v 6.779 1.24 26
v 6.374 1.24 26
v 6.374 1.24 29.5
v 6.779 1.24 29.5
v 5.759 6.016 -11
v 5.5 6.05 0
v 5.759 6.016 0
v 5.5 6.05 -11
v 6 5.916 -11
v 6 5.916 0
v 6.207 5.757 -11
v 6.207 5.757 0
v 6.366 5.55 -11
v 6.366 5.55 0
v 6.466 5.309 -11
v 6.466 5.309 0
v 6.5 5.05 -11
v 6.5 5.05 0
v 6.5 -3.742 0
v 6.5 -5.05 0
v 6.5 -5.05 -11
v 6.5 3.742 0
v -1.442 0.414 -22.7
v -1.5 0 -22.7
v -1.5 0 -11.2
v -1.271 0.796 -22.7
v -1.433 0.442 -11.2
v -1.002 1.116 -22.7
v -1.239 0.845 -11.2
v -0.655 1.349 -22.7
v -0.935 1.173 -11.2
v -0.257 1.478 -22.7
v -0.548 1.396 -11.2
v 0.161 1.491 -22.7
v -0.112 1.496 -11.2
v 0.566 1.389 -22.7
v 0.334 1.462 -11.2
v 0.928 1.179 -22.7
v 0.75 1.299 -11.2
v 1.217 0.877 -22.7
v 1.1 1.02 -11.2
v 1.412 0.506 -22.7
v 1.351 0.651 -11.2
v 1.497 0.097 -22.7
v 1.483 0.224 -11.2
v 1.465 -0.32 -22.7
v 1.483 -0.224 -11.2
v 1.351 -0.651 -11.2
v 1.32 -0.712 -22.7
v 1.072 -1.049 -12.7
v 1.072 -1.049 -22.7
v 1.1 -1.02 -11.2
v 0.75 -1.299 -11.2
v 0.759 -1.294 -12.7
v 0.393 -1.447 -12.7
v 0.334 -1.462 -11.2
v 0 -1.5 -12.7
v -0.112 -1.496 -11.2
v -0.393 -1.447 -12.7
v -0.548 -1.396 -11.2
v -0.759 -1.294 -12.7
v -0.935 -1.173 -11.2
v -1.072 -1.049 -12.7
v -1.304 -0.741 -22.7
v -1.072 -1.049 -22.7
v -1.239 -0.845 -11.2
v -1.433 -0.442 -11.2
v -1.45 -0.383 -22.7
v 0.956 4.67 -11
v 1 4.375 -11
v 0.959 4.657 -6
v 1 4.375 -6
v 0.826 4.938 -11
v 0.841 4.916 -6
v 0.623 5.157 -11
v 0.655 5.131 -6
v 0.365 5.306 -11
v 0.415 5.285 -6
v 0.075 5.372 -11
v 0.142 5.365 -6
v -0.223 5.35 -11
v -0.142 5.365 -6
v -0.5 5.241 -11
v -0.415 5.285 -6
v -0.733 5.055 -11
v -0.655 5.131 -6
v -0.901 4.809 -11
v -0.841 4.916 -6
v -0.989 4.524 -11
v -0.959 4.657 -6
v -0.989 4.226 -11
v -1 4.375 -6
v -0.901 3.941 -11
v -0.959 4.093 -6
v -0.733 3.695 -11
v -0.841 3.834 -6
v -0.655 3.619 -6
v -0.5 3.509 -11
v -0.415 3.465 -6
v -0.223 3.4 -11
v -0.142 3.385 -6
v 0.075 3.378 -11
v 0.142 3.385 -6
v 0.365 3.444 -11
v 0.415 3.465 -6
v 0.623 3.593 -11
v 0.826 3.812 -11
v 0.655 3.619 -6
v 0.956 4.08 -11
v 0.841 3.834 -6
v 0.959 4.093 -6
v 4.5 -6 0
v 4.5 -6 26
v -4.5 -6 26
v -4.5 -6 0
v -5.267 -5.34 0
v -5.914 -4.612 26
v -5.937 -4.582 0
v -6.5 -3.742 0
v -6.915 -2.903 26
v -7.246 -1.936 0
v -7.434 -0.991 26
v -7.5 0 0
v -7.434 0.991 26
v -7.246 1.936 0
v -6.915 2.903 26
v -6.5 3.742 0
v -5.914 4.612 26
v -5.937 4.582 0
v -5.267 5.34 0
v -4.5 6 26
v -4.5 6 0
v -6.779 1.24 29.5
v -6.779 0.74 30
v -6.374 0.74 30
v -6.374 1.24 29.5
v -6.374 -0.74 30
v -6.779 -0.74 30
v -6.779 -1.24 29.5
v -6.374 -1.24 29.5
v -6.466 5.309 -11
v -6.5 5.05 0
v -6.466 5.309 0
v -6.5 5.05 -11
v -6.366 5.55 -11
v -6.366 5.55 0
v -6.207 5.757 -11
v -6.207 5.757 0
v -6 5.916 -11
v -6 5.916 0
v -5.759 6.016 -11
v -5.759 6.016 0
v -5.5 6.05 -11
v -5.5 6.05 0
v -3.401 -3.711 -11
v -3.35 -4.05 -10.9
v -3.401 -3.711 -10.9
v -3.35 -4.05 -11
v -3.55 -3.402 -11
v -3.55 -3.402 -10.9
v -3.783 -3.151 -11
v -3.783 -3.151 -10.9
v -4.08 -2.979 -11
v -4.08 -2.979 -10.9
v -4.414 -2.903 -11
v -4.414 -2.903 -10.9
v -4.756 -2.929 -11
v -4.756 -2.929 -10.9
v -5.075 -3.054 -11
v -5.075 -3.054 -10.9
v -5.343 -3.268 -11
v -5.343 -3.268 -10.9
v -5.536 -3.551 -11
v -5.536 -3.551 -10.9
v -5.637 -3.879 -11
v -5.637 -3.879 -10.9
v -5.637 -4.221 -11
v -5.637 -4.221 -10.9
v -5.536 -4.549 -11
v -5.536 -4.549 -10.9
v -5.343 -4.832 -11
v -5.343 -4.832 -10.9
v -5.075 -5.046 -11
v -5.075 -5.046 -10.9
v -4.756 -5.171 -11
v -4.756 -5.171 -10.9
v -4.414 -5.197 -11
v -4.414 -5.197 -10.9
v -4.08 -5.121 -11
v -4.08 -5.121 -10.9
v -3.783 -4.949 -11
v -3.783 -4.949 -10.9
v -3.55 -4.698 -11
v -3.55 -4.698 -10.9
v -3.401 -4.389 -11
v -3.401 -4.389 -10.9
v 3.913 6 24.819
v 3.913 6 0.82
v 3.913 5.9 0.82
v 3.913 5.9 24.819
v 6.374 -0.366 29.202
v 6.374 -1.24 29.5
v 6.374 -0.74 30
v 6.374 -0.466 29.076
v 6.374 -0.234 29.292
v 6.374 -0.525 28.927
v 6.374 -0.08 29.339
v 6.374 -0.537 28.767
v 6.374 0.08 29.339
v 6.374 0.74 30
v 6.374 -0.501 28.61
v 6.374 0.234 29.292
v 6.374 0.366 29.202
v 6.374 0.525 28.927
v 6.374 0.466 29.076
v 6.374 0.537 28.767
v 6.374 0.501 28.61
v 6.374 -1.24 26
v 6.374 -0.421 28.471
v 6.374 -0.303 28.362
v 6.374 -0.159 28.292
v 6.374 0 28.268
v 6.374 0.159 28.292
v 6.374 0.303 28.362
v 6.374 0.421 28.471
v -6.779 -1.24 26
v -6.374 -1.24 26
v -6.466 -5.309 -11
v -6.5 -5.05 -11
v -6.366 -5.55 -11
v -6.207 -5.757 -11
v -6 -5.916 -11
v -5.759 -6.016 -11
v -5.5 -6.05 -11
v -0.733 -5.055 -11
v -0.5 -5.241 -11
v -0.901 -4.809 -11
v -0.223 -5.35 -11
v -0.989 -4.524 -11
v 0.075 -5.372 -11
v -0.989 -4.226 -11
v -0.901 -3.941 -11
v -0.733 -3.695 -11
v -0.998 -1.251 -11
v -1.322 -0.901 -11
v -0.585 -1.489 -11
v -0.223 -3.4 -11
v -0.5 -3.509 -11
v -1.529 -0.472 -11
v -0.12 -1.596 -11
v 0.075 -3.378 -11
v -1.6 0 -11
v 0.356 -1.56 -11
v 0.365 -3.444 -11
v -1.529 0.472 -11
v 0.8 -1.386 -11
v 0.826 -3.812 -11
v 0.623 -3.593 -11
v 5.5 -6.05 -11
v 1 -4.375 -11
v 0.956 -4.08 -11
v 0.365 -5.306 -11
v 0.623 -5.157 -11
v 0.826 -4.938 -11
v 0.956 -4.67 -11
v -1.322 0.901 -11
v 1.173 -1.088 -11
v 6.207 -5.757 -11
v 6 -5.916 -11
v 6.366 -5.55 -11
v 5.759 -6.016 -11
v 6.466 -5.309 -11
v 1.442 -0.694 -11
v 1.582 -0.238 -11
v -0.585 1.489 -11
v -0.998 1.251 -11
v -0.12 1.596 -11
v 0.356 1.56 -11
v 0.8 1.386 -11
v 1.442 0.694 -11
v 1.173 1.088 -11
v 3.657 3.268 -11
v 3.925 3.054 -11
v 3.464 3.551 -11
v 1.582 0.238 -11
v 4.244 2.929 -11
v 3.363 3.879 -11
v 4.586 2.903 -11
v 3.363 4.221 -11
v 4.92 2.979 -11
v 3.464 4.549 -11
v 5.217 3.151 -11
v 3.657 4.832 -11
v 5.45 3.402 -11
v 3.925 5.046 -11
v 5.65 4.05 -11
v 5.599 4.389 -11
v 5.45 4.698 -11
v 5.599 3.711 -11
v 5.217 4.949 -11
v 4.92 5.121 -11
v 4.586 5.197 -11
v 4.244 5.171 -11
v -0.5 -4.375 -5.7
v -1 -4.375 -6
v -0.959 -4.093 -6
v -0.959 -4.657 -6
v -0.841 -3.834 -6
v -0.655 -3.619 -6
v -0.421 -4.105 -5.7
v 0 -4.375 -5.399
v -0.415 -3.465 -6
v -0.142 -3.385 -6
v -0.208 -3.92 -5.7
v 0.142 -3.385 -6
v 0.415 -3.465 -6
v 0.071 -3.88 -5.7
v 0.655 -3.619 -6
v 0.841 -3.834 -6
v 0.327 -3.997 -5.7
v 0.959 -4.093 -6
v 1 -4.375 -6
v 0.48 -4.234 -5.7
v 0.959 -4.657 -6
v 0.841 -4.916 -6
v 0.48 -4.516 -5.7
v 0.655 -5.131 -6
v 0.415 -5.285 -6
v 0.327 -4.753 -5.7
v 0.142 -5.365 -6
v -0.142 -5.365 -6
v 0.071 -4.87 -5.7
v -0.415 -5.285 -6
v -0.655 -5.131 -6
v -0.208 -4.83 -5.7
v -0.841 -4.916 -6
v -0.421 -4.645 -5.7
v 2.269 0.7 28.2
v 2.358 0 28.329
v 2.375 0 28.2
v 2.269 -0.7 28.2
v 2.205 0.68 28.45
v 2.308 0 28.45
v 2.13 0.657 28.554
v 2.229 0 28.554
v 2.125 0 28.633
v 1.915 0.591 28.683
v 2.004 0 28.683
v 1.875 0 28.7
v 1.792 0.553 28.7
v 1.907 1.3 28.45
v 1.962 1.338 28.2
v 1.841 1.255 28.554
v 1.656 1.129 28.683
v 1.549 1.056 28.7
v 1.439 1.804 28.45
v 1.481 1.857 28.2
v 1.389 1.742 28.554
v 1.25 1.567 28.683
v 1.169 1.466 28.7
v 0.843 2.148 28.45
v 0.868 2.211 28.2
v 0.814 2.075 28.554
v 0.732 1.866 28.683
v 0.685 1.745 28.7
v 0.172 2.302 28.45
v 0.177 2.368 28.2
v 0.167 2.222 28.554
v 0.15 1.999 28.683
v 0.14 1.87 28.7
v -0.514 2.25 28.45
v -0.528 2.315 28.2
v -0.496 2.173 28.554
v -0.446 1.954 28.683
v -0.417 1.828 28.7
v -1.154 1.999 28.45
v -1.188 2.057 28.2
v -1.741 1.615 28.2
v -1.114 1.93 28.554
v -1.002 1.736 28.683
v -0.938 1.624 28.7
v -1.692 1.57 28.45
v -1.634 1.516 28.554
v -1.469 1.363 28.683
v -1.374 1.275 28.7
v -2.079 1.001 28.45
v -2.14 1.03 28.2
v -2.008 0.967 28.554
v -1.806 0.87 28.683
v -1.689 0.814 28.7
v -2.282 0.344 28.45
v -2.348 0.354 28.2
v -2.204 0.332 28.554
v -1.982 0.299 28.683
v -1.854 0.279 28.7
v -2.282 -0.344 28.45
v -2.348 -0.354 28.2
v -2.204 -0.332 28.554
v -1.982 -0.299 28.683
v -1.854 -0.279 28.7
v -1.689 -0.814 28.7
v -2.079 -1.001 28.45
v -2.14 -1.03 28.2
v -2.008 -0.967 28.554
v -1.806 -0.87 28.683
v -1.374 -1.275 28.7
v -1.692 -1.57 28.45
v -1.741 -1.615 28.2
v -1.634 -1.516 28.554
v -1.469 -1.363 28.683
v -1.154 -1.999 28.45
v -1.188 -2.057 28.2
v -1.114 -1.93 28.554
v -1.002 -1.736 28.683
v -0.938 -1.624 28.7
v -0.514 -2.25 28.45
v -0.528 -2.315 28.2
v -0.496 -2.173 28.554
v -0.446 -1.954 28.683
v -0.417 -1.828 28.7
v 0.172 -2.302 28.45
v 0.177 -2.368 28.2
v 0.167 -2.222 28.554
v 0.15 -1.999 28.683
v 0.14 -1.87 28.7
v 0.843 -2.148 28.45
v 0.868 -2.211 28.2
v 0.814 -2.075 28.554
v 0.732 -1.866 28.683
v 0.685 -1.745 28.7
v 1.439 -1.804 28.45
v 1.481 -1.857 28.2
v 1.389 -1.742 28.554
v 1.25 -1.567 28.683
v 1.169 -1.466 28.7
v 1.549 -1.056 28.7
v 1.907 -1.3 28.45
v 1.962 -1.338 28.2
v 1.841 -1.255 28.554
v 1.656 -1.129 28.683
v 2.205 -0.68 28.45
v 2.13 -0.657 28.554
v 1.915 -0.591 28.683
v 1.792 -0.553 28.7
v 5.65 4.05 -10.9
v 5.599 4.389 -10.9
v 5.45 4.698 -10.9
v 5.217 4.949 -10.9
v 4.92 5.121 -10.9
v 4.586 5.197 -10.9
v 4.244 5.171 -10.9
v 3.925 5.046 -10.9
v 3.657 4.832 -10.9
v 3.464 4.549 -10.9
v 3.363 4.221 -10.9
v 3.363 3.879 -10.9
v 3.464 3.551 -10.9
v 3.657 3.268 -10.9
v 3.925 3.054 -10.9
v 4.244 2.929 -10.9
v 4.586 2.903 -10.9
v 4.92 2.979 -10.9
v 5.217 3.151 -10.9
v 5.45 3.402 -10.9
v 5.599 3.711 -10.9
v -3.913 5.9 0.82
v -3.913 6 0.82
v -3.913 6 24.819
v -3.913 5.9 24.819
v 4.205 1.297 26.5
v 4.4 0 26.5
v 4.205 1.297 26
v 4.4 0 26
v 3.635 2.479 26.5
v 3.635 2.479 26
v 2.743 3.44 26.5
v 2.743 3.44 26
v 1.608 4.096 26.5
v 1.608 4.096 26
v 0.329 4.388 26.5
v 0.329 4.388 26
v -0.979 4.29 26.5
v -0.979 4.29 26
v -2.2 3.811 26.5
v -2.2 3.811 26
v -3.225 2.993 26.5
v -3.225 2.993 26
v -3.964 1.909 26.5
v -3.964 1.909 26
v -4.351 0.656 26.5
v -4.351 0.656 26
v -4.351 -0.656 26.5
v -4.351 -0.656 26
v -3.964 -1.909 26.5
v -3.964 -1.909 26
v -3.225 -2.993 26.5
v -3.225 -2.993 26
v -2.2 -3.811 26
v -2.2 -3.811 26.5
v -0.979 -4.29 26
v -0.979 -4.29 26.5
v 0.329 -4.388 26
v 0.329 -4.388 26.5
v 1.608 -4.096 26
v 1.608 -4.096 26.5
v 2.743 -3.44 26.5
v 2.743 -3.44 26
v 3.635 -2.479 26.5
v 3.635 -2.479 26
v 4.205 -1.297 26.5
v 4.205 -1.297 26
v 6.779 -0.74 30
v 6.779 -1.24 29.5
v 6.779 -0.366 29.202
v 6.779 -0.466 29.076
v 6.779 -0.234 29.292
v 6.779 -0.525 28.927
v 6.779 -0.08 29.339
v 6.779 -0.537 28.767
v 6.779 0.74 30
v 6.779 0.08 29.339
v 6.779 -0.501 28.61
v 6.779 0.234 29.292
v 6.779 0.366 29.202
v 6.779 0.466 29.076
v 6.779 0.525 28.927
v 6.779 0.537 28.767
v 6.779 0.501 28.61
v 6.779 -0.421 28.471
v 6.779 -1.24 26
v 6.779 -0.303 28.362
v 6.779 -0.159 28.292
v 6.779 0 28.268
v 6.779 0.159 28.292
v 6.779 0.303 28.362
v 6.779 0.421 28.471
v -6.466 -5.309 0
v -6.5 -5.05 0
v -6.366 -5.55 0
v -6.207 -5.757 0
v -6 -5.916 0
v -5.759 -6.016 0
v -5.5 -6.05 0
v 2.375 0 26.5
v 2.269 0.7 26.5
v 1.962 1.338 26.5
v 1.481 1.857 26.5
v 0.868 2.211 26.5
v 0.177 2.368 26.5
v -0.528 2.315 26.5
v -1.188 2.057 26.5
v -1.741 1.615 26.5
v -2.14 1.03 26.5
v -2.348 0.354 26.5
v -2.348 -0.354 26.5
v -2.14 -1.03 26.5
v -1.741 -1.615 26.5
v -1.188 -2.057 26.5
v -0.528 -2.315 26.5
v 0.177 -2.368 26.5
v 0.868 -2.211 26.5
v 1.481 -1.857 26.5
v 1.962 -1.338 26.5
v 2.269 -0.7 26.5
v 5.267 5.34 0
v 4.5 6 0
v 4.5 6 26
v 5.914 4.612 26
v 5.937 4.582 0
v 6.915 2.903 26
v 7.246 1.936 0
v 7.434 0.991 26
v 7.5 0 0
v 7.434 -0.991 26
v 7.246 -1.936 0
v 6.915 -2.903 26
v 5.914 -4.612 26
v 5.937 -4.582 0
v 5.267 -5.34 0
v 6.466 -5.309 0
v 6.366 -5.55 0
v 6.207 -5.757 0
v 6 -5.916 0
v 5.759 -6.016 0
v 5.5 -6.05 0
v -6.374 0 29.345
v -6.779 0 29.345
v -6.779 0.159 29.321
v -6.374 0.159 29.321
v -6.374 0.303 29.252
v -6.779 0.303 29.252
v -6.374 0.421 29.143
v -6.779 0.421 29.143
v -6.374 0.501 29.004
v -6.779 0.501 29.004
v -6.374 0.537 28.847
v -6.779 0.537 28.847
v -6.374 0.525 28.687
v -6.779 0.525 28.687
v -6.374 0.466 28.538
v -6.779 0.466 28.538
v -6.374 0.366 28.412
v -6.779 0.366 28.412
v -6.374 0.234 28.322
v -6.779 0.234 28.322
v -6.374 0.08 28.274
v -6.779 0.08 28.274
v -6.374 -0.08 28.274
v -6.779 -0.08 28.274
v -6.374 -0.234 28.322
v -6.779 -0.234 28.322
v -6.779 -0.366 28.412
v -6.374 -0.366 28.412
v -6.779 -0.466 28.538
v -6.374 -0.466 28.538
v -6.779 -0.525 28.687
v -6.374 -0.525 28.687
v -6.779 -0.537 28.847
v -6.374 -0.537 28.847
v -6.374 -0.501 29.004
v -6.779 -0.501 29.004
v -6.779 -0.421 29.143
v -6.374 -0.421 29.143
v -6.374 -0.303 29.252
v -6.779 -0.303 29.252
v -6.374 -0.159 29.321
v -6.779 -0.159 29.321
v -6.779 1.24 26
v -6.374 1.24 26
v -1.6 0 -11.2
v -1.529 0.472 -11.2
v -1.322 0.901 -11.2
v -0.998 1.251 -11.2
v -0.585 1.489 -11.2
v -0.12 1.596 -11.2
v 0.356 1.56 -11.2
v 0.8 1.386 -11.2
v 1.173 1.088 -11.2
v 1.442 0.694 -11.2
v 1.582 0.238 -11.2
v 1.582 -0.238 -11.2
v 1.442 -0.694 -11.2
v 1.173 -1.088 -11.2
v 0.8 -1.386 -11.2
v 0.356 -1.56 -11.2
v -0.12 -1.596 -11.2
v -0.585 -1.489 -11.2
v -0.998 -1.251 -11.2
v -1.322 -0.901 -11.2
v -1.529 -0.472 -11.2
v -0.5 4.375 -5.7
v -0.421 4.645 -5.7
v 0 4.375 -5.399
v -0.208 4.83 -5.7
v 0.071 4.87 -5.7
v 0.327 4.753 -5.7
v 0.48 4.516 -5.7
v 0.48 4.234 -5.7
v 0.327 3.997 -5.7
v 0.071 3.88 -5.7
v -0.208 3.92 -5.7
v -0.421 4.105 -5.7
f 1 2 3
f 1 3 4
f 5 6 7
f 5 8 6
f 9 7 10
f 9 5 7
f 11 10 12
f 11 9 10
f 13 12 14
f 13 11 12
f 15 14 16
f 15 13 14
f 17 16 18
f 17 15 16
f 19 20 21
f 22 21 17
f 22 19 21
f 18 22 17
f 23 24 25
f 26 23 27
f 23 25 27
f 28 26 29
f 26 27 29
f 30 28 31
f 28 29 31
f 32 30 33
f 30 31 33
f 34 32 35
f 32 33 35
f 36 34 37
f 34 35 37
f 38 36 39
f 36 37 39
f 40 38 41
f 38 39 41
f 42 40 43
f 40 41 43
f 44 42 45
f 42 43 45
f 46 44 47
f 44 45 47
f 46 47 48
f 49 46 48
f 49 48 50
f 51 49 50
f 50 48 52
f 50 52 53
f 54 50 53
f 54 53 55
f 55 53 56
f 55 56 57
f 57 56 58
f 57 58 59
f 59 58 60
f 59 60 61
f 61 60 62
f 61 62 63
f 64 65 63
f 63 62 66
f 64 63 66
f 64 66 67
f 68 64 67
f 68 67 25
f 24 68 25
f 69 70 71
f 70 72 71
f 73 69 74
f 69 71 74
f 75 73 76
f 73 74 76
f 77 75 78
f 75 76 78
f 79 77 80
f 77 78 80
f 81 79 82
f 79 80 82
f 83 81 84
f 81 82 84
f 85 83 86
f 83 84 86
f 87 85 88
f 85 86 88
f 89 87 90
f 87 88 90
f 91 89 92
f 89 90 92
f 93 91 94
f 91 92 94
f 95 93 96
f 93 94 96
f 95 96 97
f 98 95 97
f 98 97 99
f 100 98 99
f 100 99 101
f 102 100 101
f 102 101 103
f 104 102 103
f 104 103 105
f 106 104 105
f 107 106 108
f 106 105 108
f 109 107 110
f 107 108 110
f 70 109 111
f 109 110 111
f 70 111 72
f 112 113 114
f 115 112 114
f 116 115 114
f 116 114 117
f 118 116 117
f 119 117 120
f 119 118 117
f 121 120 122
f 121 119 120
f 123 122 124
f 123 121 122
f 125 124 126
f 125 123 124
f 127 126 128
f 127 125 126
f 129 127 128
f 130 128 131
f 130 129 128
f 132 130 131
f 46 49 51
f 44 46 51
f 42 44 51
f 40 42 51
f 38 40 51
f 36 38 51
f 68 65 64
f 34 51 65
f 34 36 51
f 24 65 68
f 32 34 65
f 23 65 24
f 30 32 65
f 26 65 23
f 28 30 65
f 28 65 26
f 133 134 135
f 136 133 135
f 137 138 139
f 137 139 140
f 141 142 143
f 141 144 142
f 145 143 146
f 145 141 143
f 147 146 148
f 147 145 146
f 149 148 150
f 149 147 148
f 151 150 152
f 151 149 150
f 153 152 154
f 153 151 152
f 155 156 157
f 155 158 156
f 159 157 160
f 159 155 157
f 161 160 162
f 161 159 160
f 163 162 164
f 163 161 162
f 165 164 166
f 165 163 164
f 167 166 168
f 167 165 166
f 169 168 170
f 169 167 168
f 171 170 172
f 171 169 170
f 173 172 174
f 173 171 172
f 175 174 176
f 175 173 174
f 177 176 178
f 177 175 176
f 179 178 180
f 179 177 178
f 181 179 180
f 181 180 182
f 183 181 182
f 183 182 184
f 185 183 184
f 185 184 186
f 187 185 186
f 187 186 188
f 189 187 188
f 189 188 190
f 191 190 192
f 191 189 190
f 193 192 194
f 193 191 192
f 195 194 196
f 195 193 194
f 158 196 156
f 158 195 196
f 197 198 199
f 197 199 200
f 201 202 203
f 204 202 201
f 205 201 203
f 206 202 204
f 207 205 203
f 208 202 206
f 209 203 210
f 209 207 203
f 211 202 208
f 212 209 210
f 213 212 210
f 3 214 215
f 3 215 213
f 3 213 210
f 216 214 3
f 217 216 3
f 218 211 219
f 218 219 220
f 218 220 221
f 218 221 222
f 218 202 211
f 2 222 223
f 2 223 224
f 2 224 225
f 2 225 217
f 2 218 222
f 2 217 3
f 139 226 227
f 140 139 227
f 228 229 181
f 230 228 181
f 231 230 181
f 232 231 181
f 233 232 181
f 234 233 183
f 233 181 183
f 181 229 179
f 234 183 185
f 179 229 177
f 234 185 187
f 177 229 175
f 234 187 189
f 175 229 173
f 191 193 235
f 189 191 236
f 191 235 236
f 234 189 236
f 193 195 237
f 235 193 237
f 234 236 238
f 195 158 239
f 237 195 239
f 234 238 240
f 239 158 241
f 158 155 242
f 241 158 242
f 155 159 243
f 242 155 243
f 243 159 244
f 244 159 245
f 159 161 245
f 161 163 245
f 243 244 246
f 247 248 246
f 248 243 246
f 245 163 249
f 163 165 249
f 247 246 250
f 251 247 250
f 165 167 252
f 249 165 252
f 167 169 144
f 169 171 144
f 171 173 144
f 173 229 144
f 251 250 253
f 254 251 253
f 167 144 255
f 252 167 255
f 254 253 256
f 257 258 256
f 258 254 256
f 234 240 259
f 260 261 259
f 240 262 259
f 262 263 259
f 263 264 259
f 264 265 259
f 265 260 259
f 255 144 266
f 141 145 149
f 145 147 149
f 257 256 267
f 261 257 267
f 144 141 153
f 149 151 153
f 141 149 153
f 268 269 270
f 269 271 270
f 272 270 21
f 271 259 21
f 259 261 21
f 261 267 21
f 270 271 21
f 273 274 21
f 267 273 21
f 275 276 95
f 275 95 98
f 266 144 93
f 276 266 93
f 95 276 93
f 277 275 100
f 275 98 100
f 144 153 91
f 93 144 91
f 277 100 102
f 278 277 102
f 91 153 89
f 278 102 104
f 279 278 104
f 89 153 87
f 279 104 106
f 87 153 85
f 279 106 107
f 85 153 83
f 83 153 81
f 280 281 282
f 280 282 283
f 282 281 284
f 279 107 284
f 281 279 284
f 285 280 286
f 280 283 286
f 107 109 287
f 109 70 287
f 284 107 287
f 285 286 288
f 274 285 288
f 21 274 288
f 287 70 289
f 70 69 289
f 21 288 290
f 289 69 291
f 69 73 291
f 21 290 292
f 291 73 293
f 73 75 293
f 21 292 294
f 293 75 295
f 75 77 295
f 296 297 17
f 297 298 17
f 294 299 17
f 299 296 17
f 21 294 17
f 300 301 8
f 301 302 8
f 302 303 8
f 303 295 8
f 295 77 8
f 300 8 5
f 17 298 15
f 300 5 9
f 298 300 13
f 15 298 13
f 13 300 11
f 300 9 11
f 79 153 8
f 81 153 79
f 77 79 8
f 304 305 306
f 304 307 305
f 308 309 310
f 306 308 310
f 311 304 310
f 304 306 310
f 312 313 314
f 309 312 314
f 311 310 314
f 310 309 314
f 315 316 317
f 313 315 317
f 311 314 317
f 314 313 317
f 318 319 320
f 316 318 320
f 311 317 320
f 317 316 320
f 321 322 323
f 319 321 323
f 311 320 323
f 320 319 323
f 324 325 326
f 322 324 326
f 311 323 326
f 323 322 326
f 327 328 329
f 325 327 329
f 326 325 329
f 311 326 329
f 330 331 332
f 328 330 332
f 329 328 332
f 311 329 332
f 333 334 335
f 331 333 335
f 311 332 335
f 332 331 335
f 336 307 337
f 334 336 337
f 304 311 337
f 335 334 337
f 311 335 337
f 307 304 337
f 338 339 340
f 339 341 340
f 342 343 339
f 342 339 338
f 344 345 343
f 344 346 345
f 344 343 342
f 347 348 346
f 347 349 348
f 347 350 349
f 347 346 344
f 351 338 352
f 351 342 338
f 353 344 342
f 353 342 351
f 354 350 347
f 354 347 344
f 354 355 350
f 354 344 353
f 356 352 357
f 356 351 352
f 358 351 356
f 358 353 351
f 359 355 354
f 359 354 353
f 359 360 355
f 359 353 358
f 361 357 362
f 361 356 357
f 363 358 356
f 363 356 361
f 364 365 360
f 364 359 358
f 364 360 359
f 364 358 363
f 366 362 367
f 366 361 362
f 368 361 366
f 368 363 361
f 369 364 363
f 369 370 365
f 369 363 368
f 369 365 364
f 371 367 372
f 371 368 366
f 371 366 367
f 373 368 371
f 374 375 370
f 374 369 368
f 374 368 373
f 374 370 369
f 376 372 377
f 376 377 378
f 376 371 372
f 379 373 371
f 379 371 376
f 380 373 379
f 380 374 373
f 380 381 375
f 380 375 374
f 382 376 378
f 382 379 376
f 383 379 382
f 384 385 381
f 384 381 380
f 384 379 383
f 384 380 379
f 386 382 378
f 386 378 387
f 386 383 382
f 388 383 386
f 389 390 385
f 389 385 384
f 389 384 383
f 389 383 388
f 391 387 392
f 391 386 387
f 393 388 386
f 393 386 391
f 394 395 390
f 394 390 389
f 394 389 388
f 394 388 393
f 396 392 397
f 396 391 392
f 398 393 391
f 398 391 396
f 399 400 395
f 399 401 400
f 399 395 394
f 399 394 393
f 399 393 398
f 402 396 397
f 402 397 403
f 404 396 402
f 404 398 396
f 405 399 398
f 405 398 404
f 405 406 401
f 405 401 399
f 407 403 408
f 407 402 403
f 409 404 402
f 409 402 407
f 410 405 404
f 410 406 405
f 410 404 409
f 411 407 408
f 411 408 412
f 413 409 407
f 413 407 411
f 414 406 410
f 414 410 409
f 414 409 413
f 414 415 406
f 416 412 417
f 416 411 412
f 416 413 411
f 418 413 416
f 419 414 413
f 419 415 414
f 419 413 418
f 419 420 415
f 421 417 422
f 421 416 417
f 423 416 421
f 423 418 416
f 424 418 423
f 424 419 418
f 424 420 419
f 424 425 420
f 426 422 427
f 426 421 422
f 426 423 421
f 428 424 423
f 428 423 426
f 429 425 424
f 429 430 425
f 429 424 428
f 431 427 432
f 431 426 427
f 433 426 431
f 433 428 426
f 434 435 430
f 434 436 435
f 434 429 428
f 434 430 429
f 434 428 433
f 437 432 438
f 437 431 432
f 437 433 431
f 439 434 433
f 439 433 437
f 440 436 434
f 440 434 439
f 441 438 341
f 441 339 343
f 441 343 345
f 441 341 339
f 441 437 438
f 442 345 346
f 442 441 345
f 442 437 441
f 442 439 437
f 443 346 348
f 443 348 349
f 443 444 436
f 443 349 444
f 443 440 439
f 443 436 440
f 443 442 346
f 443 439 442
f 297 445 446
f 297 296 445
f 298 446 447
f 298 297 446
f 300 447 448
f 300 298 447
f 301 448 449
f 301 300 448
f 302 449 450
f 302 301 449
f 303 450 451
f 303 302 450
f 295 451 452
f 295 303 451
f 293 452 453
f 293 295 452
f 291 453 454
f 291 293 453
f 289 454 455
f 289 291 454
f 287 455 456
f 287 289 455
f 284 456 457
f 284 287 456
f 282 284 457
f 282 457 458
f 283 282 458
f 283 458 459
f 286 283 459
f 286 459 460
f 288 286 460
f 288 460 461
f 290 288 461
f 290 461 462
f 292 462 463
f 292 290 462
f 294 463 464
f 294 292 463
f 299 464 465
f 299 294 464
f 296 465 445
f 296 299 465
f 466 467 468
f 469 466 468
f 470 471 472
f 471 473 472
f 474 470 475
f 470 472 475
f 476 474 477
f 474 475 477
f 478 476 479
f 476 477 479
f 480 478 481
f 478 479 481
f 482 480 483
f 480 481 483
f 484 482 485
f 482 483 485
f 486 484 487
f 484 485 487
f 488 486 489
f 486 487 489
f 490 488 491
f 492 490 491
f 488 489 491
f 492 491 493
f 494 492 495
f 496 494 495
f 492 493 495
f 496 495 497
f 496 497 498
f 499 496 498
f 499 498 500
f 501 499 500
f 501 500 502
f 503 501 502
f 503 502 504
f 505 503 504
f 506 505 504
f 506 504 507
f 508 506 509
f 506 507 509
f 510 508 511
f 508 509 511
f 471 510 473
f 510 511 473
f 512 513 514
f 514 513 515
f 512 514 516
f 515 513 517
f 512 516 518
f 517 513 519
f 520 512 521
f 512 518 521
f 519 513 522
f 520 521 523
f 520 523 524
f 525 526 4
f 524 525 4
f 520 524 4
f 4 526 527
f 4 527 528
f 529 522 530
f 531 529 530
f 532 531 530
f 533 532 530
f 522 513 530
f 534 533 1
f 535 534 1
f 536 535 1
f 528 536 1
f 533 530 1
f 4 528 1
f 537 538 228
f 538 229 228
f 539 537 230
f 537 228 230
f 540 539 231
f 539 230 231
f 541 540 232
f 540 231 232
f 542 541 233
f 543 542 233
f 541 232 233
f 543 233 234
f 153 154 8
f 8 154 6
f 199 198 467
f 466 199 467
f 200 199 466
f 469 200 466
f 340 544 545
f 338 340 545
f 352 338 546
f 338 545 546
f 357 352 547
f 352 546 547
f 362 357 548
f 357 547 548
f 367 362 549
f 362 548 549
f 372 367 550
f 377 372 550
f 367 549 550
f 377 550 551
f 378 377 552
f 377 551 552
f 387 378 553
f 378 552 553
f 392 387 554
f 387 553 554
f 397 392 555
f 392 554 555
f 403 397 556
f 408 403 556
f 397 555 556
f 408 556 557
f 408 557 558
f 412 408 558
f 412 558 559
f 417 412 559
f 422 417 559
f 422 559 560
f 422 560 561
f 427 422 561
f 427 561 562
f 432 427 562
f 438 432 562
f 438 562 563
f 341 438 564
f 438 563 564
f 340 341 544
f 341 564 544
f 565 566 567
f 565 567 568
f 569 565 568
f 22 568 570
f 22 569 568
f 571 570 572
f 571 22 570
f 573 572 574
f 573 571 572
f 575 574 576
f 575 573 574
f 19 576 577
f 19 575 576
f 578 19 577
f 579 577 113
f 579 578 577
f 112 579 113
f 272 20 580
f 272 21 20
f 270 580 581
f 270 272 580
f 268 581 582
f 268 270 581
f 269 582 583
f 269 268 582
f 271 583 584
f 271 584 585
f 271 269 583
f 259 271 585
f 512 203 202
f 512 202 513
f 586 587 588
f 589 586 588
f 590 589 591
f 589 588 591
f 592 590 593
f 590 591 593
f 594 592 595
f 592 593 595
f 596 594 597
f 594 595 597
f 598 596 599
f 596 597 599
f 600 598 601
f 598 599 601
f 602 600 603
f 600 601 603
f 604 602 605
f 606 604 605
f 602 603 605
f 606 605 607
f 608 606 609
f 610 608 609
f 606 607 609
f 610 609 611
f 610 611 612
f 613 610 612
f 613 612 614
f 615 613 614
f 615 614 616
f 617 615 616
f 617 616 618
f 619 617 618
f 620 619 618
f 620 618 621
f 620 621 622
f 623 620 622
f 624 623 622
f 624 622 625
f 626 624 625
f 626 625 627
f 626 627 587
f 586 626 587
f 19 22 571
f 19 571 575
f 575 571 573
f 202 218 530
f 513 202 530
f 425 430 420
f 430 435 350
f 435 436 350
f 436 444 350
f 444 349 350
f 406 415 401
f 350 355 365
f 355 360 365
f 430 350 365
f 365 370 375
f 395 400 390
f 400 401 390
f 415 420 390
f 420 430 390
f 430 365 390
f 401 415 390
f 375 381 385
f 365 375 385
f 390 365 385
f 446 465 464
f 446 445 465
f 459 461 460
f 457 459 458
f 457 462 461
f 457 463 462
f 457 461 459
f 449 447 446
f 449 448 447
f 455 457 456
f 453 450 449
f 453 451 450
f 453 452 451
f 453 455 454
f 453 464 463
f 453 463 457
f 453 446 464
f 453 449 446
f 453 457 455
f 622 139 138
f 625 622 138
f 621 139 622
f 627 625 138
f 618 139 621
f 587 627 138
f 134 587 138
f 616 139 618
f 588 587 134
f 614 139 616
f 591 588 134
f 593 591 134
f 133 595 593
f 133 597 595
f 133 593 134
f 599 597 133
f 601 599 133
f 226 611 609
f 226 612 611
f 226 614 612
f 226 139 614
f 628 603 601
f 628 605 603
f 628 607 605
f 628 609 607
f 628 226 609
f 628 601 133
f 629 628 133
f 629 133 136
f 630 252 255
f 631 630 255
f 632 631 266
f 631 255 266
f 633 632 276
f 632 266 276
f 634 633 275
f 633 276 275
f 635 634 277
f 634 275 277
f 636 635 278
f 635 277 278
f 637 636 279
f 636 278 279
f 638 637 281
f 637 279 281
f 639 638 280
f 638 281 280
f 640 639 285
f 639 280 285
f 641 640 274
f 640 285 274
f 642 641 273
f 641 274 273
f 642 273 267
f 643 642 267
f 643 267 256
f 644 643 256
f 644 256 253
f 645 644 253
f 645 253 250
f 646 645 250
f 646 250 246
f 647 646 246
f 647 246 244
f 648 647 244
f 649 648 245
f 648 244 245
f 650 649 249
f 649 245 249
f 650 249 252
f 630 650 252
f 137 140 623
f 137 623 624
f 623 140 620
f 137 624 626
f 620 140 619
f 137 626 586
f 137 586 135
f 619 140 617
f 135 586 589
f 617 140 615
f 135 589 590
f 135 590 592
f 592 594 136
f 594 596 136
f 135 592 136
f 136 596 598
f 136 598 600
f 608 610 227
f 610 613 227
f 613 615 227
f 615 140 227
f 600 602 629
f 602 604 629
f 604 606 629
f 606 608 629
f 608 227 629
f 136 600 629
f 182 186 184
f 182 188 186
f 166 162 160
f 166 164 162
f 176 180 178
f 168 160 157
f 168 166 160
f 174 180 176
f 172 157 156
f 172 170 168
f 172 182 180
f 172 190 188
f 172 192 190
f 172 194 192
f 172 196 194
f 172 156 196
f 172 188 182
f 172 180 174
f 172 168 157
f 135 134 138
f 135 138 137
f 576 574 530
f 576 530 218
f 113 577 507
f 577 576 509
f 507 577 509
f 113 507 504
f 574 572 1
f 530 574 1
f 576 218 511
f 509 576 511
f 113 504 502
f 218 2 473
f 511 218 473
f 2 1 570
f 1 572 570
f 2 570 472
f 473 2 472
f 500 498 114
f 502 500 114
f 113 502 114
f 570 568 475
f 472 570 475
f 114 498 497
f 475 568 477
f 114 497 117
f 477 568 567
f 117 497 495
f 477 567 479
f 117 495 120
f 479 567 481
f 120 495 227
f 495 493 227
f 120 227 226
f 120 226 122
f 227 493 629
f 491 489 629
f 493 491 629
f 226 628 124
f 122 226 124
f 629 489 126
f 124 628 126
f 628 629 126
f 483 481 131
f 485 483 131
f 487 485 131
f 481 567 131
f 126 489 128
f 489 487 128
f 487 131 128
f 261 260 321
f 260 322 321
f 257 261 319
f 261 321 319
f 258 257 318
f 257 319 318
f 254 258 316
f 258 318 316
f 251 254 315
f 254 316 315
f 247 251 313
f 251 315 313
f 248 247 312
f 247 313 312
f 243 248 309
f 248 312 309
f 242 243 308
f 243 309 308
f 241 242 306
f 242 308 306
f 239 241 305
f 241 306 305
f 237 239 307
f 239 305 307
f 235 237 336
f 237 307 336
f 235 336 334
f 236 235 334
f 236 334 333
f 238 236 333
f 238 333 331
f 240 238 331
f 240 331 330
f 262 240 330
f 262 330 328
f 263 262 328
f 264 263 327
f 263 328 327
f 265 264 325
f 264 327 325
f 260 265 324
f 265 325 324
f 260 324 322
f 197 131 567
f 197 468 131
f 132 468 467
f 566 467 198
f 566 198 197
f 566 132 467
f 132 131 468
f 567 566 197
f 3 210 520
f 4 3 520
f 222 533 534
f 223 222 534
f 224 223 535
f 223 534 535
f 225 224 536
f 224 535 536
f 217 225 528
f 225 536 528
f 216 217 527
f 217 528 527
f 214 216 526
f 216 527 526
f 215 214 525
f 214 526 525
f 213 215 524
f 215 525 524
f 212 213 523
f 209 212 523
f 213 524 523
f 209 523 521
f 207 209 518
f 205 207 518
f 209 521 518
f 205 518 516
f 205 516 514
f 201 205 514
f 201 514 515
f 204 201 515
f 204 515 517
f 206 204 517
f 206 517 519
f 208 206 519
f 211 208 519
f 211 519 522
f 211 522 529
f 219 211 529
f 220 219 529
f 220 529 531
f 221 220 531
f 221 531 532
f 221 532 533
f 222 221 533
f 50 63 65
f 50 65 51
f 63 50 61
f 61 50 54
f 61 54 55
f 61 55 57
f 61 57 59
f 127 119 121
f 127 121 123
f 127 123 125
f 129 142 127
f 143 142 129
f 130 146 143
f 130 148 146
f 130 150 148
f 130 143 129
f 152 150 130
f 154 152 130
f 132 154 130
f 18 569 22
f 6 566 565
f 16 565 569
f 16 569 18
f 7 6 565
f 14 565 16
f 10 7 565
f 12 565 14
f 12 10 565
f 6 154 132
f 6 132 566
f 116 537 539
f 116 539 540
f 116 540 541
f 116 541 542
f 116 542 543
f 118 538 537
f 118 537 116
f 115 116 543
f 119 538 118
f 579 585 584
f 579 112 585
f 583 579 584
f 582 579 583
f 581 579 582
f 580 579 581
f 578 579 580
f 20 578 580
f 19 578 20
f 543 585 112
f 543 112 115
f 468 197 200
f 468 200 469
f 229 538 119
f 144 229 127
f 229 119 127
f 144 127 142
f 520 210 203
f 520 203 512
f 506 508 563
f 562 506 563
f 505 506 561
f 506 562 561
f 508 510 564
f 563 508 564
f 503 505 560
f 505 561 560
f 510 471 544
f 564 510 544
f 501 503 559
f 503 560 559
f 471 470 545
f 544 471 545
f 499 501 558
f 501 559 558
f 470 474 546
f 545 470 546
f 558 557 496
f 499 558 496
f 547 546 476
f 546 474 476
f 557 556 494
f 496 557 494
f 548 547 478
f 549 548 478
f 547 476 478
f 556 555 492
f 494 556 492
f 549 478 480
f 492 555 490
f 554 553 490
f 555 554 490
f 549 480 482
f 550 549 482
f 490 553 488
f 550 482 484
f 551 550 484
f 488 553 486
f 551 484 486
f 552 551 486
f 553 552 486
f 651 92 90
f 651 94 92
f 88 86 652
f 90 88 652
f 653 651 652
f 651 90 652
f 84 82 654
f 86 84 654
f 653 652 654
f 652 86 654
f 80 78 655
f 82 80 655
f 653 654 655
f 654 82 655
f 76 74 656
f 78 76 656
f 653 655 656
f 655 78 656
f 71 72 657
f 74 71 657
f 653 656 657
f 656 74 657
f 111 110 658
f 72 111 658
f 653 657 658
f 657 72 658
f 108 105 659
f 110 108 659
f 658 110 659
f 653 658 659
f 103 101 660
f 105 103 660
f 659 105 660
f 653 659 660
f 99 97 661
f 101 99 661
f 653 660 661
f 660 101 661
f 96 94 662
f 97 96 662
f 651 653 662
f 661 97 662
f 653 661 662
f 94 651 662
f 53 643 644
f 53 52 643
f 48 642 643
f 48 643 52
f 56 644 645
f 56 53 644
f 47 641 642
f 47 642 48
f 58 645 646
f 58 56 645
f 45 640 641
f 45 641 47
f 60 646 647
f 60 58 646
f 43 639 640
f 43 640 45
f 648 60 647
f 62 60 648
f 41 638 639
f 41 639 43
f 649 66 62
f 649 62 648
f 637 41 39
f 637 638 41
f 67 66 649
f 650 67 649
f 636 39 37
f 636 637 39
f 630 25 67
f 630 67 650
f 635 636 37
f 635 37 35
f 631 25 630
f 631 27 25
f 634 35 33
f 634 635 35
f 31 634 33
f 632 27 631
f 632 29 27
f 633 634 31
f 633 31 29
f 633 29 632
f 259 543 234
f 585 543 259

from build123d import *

# Parameters (mm, degrees)
CROQUIS1_W                        = 13
CROQUIS1_H                        = 12.1
SALIENTE_EXTRUIR1_DEPTH           = 11
SALIENTE_EXTRUIR2_DEPTH           = 26
CROQUIS3_R                        = 1.6
SALIENTE_EXTRUIR3_DEPTH           = 0.2
CROQUIS4_R                        = 1.5
SALIENTE_EXTRUIR4_DEPTH           = 11.5
CORTAR_EXTRUIR1_START             = -10
CORTAR_EXTRUIR1_DEPTH             = 10
CROQUIS6_W                        = 0.404320018
CROQUIS6_H                        = 2.479368964
SALIENTE_EXTRUIR5_DEPTH           = 4
CROQUIS7_W                        = 0.404320018
CROQUIS7_H                        = 2.479368964
SALIENTE_EXTRUIR6_DEPTH           = 4
CROQUIS8_W                        = 7.825868338
CROQUIS8_H                        = 23.999330497
CORTAR_EXTRUIR2_DEPTH             = 0.1
CROQUIS10_W                       = 1.15
CROQUIS10_H                       = 0.1
CROQUIS11_W                       = 1.15
CROQUIS11_H                       = 0.1
TALADRO1_D                        = 1.077216746
TALADRO1_DEPTH                    = 1.125812406
TALADRO2_D                        = 1.077216746
TALADRO2_DEPTH                    = 1.125812406
DI_METRO_DE_TALADRO_2_0_2_1_D     = 2
DI_METRO_DE_TALADRO_2_0_2_1_DEPTH = 5
DI_METRO_DE_TALADRO_2_0_2_1_TIP   = 0.600860619
CHAFL_N1_SIZE                     = 0.5
REDONDEO1_R                       = 0.5
REDONDEO2_R                       = 1


with BuildPart() as part:
    # Croquis1 → Saliente-Extruir1 (new body)
    with BuildSketch(Plane.XY):
        Rectangle(CROQUIS1_W, CROQUIS1_H)
    extrude(amount=-SALIENTE_EXTRUIR1_DEPTH)

    # Croquis2 → Saliente-Extruir2 (add)
    with BuildSketch(Plane.XY):
        with BuildLine():
            Line((-4.5, 6), (4.5, 6))
            ThreePointArc((4.5, 6), (7.5, 0), (4.5, -6))
            Line((4.5, -6), (-4.5, -6))
            ThreePointArc((-4.5, -6), (-7.5, 0), (-4.5, 6))
        make_face()
    extrude(amount=SALIENTE_EXTRUIR2_DEPTH)

    # Croquis3 → Saliente-Extruir3 (add)
    with BuildSketch(Plane(origin=(0, 0, -11), x_dir=(-1, 0, 0), z_dir=(0, 0, -1))):
        Circle(CROQUIS3_R)
    extrude(amount=SALIENTE_EXTRUIR3_DEPTH)

    # Croquis4 → Saliente-Extruir4 (add)
    with BuildSketch(Plane(origin=(0, 0, -11.2), x_dir=(-1, 0, 0), z_dir=(0, 0, -1))):
        Circle(CROQUIS4_R)
    extrude(amount=SALIENTE_EXTRUIR4_DEPTH)

    # Croquis5 → Cortar-Extruir1 (cut)
    with BuildSketch(Plane(origin=(0, 0, -22.7), x_dir=(-1, 0, 0), z_dir=(0, 0, -1)).offset(CORTAR_EXTRUIR1_START)):
        with BuildLine():
            Line((1.072168527, -1.049025571), (-1.072168527, -1.049025571))
            ThreePointArc((-1.072168527, -1.049025571), (0, -1.5), (1.072168527, -1.049025571))
        make_face()
    extrude(amount=CORTAR_EXTRUIR1_DEPTH, mode=Mode.SUBTRACT)

    # Croquis6 → Saliente-Extruir5 (add)
    with BuildSketch(Plane.XY.offset(26)):
        with Locations((-6.576347603, 0)):
            Rectangle(CROQUIS6_W, CROQUIS6_H)
    extrude(amount=SALIENTE_EXTRUIR5_DEPTH)

    # Croquis7 → Saliente-Extruir6 (add)
    with BuildSketch(Plane.XY.offset(26)):
        with Locations((6.576347603, 0)):
            Rectangle(CROQUIS7_W, CROQUIS7_H)
    extrude(amount=SALIENTE_EXTRUIR6_DEPTH)

    # Croquis8 → Cortar-Extruir2 (cut)
    with BuildSketch(Plane(origin=(0, 6, 0), x_dir=(-1, 0, 0), z_dir=(0, 1, 0))):
        with Locations((0, 12.819518154)):
            Rectangle(CROQUIS8_W, CROQUIS8_H)
    extrude(amount=-CORTAR_EXTRUIR2_DEPTH, mode=Mode.SUBTRACT)

    # Croquis9 → Revolución1 (revolve)
    with BuildSketch(Plane(origin=(0, 0, 0), x_dir=(1, 0, 0), z_dir=(0, 1, 0))):
        Polygon((4.4, -26), (0, -26), (0, -28.7), (2.375, -28.7), (2.375, -26.5), (4.4, -26.5), align=None)
    revolve(axis=Axis((0, 0, 26), (0, 0, 1)))

    # Croquis10 → Cortar-Revolución1 (revolve, cut)
    with BuildSketch(Plane(origin=(0, -4.05, 0), x_dir=(1, 0, 0), z_dir=(0, 1, 0))):
        with Locations((-3.925, 10.95)):
            Rectangle(CROQUIS10_W, CROQUIS10_H)
    revolve(axis=Axis((-4.5, -4.05, -11), (0, 0, 1)), mode=Mode.SUBTRACT)

    # Croquis11 → Cortar-Revolución2 (revolve, cut)
    with BuildSketch(Plane(origin=(0, 4.05, 0), x_dir=(1, 0, 0), z_dir=(0, 1, 0))):
        with Locations((5.075, 10.95)):
            Rectangle(CROQUIS11_W, CROQUIS11_H)
    revolve(axis=Axis((4.5, 4.05, -11), (0, 0, 1)), mode=Mode.SUBTRACT)

    # Taladro1
    with Locations(Plane(origin=(-6.374187594, 0, 0), x_dir=(0, 0, -1), z_dir=(1, 0, 0))):
        with Locations((-28.806812644, 0)):
            Hole(TALADRO1_D / 2, depth=TALADRO1_DEPTH)

    # Taladro2
    with Locations(Plane.ZY.offset(-6.374187594)):
        with Locations((28.806812644, 0)):
            Hole(TALADRO2_D / 2, depth=TALADRO2_DEPTH)

    # Diámetro de taladro Ø2.0 (2)1
    with Locations(Plane(origin=(0, 0, -11), x_dir=(-1, 0, 0), z_dir=(0, 0, -1))):
        with Locations((0, 4.375), (0, -4.375)):
            Hole(DI_METRO_DE_TALADRO_2_0_2_1_D / 2, depth=DI_METRO_DE_TALADRO_2_0_2_1_DEPTH)
            with Locations((0, 0, -(DI_METRO_DE_TALADRO_2_0_2_1_DEPTH + DI_METRO_DE_TALADRO_2_0_2_1_TIP / 2))):  # 118° drill point
                Cone(0, DI_METRO_DE_TALADRO_2_0_2_1_D / 2, DI_METRO_DE_TALADRO_2_0_2_1_TIP, mode=Mode.SUBTRACT)

    # Chaflán1
    chafl_n1_edges = [part.edges().sort_by_distance(p)[0] for p in [
        (-6.576347603, -1.239684482, 30),
        (-6.576347603, 1.239684482, 30),
        (6.576347603, 1.239684482, 30),
        (6.576347603, -1.239684482, 30),
    ]]
    chamfer(chafl_n1_edges, length=CHAFL_N1_SIZE)

    # Redondeo1
    redondeo1_edges = [part.edges().sort_by_distance(p)[0] for p in [
        (-2.375, 0, 28.7),
    ]]
    fillet(redondeo1_edges, radius=REDONDEO1_R)

    # Redondeo2
    redondeo2_edges = [part.edges().sort_by_distance(p)[0] for p in [
        (-6.5, -6.05, -5.5),
        (-6.5, 6.05, -5.5),
        (6.5, 6.05, -5.5),
        (6.5, -6.05, -5.5),
    ]]
    fillet(redondeo2_edges, radius=REDONDEO2_R)


solid = part.part
